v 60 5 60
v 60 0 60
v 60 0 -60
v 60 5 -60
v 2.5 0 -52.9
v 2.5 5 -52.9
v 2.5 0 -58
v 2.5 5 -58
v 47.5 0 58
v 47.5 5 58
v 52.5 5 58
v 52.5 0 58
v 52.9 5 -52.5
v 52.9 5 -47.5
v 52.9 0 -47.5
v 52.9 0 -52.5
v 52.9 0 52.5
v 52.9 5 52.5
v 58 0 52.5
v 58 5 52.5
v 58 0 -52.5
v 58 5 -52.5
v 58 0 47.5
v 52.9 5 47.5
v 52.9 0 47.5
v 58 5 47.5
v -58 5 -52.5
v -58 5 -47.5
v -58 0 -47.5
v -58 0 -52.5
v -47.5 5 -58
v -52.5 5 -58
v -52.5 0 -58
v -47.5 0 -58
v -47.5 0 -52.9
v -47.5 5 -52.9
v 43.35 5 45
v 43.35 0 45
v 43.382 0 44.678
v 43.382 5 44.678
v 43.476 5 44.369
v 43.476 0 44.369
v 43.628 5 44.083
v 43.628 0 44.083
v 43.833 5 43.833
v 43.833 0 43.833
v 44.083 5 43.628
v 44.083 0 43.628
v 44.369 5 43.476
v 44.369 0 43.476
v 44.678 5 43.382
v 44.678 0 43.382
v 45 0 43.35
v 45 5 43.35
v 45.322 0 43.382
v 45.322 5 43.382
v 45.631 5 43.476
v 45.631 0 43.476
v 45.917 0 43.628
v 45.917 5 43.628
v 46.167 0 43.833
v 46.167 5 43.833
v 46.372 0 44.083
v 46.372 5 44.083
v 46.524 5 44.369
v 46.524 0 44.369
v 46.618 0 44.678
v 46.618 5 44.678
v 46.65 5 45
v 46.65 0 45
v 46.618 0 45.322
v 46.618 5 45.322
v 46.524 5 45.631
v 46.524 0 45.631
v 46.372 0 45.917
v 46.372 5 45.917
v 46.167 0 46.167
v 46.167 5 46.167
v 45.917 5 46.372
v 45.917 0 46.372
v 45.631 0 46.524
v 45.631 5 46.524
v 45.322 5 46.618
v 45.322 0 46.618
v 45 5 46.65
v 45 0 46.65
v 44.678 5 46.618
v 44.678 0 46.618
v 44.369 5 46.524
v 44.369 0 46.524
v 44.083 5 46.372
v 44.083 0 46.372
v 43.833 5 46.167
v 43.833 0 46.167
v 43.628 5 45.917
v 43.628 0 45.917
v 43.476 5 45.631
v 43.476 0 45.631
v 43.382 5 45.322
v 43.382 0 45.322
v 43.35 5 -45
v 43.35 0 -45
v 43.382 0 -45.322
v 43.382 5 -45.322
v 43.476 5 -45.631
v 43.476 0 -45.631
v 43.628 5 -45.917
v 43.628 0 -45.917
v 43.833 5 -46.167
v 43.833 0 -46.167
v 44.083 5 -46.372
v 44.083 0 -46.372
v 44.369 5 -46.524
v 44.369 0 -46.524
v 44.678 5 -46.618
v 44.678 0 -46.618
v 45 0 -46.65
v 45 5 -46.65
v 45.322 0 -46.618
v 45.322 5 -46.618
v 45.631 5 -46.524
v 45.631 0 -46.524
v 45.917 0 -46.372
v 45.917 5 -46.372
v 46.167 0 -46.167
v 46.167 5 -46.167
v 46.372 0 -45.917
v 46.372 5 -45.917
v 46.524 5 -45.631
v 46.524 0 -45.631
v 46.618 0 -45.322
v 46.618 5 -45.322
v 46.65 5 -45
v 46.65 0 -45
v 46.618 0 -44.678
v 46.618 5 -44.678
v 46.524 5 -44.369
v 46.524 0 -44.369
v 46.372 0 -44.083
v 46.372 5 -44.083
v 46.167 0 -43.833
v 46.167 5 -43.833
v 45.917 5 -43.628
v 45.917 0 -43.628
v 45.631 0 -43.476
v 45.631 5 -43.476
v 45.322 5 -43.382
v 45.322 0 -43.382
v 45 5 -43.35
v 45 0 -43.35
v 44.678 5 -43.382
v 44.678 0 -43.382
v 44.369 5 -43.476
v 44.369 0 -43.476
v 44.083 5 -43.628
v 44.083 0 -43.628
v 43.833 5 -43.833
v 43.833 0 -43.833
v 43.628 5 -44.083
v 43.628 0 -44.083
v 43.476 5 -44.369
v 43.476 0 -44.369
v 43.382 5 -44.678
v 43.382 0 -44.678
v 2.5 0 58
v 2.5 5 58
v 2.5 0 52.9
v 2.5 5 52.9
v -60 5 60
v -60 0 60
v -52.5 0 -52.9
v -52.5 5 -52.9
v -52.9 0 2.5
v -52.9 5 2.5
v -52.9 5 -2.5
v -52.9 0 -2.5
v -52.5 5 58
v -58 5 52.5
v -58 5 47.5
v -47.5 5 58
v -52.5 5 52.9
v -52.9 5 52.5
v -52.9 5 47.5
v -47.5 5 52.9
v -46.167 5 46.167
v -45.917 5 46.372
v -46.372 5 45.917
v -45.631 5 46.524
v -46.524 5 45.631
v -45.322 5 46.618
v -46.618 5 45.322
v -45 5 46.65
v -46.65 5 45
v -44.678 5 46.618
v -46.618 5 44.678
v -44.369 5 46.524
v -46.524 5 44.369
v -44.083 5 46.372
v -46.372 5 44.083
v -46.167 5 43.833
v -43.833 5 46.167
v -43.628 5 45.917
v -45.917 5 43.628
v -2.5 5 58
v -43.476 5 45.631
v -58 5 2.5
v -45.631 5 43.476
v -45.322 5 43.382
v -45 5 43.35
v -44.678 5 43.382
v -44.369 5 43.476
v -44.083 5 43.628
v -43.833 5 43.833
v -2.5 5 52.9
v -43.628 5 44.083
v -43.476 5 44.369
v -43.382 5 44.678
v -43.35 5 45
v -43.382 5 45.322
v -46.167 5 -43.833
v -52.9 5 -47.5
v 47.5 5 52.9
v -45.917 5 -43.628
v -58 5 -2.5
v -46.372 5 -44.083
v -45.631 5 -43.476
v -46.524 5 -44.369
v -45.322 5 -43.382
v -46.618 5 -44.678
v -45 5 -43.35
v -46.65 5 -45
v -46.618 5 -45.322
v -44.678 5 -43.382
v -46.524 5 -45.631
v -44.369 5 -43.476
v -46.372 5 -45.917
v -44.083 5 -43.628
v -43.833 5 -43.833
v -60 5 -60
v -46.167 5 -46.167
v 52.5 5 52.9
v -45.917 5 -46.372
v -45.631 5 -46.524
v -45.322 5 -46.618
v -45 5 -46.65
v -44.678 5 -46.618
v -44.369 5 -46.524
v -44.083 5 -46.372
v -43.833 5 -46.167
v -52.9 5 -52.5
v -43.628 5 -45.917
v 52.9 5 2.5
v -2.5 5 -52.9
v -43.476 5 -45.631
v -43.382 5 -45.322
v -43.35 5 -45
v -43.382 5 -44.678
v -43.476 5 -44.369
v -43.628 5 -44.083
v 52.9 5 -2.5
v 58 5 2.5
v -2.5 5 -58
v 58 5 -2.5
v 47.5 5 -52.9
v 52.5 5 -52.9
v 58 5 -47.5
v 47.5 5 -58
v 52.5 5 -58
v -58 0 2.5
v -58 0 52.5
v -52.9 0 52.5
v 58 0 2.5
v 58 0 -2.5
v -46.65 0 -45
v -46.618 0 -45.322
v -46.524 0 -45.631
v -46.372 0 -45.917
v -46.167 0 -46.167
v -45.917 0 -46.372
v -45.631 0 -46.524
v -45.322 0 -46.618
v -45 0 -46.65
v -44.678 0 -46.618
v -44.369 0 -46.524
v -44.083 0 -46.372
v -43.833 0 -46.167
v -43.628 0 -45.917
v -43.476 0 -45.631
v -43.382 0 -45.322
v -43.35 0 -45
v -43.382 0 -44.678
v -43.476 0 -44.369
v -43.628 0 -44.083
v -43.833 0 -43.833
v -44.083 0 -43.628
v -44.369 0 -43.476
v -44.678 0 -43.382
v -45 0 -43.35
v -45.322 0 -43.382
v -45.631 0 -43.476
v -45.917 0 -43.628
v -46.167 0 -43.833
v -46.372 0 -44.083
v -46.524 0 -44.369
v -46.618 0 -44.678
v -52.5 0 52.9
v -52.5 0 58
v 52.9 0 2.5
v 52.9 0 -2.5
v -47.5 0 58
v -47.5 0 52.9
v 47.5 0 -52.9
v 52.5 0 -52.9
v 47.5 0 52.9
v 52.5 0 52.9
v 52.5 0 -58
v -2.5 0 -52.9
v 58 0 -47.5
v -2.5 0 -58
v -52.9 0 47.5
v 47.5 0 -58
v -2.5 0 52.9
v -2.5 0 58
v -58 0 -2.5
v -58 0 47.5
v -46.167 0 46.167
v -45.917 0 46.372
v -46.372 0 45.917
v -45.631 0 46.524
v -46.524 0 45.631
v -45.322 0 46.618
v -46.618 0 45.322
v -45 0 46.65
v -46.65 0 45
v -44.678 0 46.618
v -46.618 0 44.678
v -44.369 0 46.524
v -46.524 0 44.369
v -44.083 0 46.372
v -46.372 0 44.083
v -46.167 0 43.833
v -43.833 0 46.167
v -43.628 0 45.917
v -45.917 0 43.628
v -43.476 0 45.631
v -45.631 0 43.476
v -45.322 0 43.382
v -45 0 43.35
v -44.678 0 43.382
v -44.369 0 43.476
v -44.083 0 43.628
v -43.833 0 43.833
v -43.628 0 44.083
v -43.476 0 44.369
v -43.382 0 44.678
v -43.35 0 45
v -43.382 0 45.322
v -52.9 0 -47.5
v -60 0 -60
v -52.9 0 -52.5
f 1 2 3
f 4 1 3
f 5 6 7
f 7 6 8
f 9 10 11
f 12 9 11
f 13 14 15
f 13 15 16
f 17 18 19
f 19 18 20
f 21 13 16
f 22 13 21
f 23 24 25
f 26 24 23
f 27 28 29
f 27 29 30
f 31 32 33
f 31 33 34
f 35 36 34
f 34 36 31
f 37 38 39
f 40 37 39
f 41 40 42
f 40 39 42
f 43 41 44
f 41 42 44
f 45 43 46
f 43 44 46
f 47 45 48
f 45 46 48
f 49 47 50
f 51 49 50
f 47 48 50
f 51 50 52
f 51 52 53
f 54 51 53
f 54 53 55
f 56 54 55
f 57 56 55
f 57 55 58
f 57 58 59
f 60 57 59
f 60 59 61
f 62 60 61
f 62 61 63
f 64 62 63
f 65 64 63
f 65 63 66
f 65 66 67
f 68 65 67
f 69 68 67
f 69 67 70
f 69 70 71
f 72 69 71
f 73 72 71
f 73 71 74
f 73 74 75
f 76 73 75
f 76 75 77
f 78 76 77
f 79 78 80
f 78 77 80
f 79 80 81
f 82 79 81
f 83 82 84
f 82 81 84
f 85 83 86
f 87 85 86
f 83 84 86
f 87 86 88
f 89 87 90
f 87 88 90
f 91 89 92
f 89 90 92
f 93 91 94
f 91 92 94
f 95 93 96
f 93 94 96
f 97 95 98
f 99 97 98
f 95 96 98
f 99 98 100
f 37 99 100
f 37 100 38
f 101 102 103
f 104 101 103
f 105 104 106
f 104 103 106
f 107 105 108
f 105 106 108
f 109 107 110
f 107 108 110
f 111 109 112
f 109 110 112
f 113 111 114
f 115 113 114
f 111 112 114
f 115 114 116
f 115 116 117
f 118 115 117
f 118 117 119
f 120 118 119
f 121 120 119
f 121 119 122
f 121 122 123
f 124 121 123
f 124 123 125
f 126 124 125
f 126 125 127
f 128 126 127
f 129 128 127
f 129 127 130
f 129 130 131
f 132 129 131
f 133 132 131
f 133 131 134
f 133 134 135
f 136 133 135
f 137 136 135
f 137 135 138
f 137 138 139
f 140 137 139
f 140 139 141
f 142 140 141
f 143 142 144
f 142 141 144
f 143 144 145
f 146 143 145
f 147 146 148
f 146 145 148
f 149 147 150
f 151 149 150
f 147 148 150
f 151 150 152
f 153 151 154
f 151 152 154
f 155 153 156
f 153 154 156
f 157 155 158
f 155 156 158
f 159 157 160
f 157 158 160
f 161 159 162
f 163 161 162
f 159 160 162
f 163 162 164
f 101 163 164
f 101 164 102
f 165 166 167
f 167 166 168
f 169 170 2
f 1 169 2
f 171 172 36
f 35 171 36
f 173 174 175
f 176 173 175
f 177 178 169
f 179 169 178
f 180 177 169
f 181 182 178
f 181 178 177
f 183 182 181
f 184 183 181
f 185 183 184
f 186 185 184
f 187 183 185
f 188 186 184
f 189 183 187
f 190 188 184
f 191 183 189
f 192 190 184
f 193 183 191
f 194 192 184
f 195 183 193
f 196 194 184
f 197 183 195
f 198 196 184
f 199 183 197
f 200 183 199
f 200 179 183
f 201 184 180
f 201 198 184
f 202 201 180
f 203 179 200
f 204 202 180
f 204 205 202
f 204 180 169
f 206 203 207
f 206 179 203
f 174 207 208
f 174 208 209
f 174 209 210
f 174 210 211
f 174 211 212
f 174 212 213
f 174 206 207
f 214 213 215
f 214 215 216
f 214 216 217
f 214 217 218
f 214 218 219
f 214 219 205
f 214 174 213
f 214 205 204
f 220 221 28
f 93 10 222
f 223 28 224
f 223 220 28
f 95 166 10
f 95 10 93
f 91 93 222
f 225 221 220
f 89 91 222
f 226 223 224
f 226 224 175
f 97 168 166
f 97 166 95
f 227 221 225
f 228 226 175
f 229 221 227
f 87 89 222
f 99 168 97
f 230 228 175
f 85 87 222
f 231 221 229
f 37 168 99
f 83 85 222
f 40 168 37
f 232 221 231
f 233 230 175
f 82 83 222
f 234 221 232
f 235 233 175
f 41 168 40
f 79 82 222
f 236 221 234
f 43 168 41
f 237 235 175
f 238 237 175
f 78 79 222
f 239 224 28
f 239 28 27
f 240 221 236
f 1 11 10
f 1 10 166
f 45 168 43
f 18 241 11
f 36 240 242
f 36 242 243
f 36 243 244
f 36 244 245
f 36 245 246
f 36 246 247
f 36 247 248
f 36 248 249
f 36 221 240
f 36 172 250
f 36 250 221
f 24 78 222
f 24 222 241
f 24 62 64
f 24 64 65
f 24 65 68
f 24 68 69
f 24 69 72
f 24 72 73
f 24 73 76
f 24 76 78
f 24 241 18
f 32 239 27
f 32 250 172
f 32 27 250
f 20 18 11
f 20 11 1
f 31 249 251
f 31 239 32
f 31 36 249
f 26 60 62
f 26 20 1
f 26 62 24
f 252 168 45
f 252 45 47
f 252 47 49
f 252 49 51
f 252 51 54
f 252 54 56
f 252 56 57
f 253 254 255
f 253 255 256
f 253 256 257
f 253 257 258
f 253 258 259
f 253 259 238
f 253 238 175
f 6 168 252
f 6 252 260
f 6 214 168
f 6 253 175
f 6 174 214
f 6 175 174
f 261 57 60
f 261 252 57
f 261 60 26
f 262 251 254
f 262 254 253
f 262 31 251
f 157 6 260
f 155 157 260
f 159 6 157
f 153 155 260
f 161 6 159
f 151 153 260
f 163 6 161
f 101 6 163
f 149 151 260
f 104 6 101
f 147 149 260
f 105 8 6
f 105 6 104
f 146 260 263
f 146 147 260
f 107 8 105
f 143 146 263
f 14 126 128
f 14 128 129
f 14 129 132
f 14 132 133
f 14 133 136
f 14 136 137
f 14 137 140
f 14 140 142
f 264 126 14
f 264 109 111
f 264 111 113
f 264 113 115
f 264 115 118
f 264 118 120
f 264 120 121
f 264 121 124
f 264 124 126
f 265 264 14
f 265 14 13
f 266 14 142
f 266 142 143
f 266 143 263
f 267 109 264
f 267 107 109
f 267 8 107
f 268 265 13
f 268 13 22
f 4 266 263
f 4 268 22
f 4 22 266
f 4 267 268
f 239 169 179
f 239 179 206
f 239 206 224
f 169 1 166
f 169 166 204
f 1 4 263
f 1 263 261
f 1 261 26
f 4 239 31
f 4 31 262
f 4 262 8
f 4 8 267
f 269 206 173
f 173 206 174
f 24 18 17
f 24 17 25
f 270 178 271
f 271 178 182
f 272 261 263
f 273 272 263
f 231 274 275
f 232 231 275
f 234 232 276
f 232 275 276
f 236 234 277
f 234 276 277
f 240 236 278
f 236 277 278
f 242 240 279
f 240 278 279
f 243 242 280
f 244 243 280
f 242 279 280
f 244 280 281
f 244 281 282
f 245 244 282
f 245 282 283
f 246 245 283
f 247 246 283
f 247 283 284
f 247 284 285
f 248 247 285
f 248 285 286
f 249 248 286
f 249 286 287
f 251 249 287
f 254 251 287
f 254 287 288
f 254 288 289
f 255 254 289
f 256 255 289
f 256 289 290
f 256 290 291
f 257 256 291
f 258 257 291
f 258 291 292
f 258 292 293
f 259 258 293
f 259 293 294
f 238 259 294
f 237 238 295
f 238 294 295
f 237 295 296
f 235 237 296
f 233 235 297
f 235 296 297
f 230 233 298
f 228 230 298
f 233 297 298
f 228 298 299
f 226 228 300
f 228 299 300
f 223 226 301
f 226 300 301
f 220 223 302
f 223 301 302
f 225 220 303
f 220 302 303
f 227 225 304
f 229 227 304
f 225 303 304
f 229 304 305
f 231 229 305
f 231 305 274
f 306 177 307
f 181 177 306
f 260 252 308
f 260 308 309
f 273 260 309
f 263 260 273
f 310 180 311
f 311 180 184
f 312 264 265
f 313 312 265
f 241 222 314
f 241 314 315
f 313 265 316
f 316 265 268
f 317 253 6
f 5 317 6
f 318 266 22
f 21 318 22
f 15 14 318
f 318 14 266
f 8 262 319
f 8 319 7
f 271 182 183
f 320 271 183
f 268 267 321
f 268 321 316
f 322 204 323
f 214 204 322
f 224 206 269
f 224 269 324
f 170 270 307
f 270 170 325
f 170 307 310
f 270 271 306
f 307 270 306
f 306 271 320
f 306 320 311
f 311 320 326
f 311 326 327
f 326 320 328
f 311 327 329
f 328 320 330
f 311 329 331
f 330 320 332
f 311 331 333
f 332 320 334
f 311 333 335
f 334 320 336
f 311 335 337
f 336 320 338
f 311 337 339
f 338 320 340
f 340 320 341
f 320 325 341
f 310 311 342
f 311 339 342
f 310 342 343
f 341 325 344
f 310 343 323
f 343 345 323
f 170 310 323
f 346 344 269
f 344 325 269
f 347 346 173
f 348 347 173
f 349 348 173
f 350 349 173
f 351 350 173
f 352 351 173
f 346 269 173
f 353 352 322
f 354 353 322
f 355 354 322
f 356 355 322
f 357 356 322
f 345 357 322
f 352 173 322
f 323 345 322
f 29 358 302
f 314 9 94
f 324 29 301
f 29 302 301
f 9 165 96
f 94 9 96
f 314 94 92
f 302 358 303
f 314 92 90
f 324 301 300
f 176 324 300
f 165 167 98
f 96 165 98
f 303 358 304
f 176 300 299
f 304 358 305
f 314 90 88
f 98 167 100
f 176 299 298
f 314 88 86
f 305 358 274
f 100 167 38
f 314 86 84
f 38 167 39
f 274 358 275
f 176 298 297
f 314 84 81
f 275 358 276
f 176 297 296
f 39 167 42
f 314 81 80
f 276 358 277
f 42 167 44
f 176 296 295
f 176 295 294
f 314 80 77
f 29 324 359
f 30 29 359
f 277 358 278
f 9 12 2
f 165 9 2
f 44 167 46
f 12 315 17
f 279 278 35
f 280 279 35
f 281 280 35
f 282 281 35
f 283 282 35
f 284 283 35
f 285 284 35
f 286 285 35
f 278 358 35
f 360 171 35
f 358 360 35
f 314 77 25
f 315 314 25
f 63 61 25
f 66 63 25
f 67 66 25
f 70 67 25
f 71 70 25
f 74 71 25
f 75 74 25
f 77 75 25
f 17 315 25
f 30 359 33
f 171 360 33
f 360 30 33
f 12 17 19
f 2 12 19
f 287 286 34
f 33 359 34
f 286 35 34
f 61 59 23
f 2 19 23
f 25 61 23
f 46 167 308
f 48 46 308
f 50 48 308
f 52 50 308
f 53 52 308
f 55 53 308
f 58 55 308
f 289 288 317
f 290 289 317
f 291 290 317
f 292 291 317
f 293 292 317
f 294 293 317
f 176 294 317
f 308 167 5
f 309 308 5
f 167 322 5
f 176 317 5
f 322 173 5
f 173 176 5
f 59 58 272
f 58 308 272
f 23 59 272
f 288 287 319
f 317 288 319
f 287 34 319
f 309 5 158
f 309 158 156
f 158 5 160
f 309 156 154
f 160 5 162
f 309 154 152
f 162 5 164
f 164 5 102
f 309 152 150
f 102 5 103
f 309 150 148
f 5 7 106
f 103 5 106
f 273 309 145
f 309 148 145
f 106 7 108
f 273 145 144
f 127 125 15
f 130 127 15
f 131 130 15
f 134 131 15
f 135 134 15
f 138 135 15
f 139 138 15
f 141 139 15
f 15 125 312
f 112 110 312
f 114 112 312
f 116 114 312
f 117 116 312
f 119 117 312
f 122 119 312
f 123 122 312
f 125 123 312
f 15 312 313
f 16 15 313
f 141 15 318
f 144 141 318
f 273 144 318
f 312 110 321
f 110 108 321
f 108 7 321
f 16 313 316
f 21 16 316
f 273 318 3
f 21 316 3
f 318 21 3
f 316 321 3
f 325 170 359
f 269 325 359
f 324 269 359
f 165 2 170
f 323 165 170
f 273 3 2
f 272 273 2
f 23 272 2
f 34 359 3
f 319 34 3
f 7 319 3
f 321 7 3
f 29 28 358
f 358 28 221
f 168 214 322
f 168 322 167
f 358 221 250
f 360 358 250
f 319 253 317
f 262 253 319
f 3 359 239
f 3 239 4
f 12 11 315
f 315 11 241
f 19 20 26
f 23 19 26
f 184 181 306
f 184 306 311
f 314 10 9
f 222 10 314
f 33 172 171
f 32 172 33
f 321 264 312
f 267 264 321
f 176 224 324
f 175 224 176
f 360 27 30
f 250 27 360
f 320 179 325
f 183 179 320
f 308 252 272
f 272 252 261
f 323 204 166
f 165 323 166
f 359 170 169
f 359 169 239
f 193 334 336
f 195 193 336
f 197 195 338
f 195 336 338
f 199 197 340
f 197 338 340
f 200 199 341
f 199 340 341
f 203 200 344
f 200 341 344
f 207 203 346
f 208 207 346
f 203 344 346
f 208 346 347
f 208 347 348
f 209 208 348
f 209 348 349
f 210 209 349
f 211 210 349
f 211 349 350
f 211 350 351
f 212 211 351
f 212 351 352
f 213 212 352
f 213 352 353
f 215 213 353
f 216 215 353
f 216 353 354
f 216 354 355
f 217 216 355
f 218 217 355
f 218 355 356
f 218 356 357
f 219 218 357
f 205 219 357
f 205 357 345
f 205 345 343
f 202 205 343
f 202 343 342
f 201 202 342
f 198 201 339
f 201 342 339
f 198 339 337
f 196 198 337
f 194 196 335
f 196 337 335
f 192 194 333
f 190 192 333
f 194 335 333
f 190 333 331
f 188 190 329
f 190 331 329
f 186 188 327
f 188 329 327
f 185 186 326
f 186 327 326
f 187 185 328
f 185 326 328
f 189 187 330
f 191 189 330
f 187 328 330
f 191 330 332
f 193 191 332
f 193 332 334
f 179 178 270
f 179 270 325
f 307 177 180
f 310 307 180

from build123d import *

# Parameters (mm, degrees)
SKETCH1_W                  = 120
SKETCH1_H                  = 120
BOSS_EXTRUDE1_DEPTH        = 5
F_3_3_3_3_DIAMETER_HOLE1_D = 3.3
SKETCH5_W                  = 5.1
SKETCH5_H                  = 5
SKETCH5_W_2                = 5
SKETCH5_H_2                = 5.1
CUT_EXTRUDE1_DEPTH         = 6


with BuildPart() as part:
    # Sketch1 → Boss-Extrude1 (new body)
    with BuildSketch(Plane(origin=(0, 0, 0), x_dir=(1, 0, 0), z_dir=(0, 1, 0))):
        Rectangle(SKETCH1_W, SKETCH1_H)
    extrude(amount=BOSS_EXTRUDE1_DEPTH)

    # Ø3.3 (3.3) Diameter Hole1 (through all)
    with Locations(Plane(origin=(0, 5, 0), x_dir=(1, 0, 0), z_dir=(0, 1, 0))):
        with Locations((-45, 45), (45, 45), (45, -45), (-45, -45)):
            Hole(F_3_3_3_3_DIAMETER_HOLE1_D / 2)

    # Sketch5 → Cut-Extrude1 (cut, through all)
    with BuildSketch(Plane(origin=(0, 5, 0), x_dir=(1, 0, 0), z_dir=(0, 1, 0))):
        with Locations((-55.45, 50)):
            Rectangle(SKETCH5_W, SKETCH5_H)
        with Locations((-55.45, -50)):
            Rectangle(SKETCH5_W, SKETCH5_H)
        with Locations((-50, -55.45)):
            Rectangle(SKETCH5_W_2, SKETCH5_H_2)
        with Locations((50, -55.45)):
            Rectangle(SKETCH5_W_2, SKETCH5_H_2)
        with Locations((-50, 55.45)):
            Rectangle(SKETCH5_W_2, SKETCH5_H_2)
        with Locations((50, 55.45)):
            Rectangle(SKETCH5_W_2, SKETCH5_H_2)
        with Locations((55.45, 50)):
            Rectangle(SKETCH5_W, SKETCH5_H)
        with Locations((55.45, -50)):
            Rectangle(SKETCH5_W, SKETCH5_H)
        with Locations((-55.45, 0)):
            Rectangle(SKETCH5_W, SKETCH5_H)
        with Locations((0, 55.45)):
            Rectangle(SKETCH5_W_2, SKETCH5_H_2)
        with Locations((0, -55.45)):
            Rectangle(SKETCH5_W_2, SKETCH5_H_2)
        with Locations((55.45, 0)):
            Rectangle(SKETCH5_W, SKETCH5_H)
    extrude(amount=-CUT_EXTRUDE1_DEPTH, mode=Mode.SUBTRACT)


solid = part.part
